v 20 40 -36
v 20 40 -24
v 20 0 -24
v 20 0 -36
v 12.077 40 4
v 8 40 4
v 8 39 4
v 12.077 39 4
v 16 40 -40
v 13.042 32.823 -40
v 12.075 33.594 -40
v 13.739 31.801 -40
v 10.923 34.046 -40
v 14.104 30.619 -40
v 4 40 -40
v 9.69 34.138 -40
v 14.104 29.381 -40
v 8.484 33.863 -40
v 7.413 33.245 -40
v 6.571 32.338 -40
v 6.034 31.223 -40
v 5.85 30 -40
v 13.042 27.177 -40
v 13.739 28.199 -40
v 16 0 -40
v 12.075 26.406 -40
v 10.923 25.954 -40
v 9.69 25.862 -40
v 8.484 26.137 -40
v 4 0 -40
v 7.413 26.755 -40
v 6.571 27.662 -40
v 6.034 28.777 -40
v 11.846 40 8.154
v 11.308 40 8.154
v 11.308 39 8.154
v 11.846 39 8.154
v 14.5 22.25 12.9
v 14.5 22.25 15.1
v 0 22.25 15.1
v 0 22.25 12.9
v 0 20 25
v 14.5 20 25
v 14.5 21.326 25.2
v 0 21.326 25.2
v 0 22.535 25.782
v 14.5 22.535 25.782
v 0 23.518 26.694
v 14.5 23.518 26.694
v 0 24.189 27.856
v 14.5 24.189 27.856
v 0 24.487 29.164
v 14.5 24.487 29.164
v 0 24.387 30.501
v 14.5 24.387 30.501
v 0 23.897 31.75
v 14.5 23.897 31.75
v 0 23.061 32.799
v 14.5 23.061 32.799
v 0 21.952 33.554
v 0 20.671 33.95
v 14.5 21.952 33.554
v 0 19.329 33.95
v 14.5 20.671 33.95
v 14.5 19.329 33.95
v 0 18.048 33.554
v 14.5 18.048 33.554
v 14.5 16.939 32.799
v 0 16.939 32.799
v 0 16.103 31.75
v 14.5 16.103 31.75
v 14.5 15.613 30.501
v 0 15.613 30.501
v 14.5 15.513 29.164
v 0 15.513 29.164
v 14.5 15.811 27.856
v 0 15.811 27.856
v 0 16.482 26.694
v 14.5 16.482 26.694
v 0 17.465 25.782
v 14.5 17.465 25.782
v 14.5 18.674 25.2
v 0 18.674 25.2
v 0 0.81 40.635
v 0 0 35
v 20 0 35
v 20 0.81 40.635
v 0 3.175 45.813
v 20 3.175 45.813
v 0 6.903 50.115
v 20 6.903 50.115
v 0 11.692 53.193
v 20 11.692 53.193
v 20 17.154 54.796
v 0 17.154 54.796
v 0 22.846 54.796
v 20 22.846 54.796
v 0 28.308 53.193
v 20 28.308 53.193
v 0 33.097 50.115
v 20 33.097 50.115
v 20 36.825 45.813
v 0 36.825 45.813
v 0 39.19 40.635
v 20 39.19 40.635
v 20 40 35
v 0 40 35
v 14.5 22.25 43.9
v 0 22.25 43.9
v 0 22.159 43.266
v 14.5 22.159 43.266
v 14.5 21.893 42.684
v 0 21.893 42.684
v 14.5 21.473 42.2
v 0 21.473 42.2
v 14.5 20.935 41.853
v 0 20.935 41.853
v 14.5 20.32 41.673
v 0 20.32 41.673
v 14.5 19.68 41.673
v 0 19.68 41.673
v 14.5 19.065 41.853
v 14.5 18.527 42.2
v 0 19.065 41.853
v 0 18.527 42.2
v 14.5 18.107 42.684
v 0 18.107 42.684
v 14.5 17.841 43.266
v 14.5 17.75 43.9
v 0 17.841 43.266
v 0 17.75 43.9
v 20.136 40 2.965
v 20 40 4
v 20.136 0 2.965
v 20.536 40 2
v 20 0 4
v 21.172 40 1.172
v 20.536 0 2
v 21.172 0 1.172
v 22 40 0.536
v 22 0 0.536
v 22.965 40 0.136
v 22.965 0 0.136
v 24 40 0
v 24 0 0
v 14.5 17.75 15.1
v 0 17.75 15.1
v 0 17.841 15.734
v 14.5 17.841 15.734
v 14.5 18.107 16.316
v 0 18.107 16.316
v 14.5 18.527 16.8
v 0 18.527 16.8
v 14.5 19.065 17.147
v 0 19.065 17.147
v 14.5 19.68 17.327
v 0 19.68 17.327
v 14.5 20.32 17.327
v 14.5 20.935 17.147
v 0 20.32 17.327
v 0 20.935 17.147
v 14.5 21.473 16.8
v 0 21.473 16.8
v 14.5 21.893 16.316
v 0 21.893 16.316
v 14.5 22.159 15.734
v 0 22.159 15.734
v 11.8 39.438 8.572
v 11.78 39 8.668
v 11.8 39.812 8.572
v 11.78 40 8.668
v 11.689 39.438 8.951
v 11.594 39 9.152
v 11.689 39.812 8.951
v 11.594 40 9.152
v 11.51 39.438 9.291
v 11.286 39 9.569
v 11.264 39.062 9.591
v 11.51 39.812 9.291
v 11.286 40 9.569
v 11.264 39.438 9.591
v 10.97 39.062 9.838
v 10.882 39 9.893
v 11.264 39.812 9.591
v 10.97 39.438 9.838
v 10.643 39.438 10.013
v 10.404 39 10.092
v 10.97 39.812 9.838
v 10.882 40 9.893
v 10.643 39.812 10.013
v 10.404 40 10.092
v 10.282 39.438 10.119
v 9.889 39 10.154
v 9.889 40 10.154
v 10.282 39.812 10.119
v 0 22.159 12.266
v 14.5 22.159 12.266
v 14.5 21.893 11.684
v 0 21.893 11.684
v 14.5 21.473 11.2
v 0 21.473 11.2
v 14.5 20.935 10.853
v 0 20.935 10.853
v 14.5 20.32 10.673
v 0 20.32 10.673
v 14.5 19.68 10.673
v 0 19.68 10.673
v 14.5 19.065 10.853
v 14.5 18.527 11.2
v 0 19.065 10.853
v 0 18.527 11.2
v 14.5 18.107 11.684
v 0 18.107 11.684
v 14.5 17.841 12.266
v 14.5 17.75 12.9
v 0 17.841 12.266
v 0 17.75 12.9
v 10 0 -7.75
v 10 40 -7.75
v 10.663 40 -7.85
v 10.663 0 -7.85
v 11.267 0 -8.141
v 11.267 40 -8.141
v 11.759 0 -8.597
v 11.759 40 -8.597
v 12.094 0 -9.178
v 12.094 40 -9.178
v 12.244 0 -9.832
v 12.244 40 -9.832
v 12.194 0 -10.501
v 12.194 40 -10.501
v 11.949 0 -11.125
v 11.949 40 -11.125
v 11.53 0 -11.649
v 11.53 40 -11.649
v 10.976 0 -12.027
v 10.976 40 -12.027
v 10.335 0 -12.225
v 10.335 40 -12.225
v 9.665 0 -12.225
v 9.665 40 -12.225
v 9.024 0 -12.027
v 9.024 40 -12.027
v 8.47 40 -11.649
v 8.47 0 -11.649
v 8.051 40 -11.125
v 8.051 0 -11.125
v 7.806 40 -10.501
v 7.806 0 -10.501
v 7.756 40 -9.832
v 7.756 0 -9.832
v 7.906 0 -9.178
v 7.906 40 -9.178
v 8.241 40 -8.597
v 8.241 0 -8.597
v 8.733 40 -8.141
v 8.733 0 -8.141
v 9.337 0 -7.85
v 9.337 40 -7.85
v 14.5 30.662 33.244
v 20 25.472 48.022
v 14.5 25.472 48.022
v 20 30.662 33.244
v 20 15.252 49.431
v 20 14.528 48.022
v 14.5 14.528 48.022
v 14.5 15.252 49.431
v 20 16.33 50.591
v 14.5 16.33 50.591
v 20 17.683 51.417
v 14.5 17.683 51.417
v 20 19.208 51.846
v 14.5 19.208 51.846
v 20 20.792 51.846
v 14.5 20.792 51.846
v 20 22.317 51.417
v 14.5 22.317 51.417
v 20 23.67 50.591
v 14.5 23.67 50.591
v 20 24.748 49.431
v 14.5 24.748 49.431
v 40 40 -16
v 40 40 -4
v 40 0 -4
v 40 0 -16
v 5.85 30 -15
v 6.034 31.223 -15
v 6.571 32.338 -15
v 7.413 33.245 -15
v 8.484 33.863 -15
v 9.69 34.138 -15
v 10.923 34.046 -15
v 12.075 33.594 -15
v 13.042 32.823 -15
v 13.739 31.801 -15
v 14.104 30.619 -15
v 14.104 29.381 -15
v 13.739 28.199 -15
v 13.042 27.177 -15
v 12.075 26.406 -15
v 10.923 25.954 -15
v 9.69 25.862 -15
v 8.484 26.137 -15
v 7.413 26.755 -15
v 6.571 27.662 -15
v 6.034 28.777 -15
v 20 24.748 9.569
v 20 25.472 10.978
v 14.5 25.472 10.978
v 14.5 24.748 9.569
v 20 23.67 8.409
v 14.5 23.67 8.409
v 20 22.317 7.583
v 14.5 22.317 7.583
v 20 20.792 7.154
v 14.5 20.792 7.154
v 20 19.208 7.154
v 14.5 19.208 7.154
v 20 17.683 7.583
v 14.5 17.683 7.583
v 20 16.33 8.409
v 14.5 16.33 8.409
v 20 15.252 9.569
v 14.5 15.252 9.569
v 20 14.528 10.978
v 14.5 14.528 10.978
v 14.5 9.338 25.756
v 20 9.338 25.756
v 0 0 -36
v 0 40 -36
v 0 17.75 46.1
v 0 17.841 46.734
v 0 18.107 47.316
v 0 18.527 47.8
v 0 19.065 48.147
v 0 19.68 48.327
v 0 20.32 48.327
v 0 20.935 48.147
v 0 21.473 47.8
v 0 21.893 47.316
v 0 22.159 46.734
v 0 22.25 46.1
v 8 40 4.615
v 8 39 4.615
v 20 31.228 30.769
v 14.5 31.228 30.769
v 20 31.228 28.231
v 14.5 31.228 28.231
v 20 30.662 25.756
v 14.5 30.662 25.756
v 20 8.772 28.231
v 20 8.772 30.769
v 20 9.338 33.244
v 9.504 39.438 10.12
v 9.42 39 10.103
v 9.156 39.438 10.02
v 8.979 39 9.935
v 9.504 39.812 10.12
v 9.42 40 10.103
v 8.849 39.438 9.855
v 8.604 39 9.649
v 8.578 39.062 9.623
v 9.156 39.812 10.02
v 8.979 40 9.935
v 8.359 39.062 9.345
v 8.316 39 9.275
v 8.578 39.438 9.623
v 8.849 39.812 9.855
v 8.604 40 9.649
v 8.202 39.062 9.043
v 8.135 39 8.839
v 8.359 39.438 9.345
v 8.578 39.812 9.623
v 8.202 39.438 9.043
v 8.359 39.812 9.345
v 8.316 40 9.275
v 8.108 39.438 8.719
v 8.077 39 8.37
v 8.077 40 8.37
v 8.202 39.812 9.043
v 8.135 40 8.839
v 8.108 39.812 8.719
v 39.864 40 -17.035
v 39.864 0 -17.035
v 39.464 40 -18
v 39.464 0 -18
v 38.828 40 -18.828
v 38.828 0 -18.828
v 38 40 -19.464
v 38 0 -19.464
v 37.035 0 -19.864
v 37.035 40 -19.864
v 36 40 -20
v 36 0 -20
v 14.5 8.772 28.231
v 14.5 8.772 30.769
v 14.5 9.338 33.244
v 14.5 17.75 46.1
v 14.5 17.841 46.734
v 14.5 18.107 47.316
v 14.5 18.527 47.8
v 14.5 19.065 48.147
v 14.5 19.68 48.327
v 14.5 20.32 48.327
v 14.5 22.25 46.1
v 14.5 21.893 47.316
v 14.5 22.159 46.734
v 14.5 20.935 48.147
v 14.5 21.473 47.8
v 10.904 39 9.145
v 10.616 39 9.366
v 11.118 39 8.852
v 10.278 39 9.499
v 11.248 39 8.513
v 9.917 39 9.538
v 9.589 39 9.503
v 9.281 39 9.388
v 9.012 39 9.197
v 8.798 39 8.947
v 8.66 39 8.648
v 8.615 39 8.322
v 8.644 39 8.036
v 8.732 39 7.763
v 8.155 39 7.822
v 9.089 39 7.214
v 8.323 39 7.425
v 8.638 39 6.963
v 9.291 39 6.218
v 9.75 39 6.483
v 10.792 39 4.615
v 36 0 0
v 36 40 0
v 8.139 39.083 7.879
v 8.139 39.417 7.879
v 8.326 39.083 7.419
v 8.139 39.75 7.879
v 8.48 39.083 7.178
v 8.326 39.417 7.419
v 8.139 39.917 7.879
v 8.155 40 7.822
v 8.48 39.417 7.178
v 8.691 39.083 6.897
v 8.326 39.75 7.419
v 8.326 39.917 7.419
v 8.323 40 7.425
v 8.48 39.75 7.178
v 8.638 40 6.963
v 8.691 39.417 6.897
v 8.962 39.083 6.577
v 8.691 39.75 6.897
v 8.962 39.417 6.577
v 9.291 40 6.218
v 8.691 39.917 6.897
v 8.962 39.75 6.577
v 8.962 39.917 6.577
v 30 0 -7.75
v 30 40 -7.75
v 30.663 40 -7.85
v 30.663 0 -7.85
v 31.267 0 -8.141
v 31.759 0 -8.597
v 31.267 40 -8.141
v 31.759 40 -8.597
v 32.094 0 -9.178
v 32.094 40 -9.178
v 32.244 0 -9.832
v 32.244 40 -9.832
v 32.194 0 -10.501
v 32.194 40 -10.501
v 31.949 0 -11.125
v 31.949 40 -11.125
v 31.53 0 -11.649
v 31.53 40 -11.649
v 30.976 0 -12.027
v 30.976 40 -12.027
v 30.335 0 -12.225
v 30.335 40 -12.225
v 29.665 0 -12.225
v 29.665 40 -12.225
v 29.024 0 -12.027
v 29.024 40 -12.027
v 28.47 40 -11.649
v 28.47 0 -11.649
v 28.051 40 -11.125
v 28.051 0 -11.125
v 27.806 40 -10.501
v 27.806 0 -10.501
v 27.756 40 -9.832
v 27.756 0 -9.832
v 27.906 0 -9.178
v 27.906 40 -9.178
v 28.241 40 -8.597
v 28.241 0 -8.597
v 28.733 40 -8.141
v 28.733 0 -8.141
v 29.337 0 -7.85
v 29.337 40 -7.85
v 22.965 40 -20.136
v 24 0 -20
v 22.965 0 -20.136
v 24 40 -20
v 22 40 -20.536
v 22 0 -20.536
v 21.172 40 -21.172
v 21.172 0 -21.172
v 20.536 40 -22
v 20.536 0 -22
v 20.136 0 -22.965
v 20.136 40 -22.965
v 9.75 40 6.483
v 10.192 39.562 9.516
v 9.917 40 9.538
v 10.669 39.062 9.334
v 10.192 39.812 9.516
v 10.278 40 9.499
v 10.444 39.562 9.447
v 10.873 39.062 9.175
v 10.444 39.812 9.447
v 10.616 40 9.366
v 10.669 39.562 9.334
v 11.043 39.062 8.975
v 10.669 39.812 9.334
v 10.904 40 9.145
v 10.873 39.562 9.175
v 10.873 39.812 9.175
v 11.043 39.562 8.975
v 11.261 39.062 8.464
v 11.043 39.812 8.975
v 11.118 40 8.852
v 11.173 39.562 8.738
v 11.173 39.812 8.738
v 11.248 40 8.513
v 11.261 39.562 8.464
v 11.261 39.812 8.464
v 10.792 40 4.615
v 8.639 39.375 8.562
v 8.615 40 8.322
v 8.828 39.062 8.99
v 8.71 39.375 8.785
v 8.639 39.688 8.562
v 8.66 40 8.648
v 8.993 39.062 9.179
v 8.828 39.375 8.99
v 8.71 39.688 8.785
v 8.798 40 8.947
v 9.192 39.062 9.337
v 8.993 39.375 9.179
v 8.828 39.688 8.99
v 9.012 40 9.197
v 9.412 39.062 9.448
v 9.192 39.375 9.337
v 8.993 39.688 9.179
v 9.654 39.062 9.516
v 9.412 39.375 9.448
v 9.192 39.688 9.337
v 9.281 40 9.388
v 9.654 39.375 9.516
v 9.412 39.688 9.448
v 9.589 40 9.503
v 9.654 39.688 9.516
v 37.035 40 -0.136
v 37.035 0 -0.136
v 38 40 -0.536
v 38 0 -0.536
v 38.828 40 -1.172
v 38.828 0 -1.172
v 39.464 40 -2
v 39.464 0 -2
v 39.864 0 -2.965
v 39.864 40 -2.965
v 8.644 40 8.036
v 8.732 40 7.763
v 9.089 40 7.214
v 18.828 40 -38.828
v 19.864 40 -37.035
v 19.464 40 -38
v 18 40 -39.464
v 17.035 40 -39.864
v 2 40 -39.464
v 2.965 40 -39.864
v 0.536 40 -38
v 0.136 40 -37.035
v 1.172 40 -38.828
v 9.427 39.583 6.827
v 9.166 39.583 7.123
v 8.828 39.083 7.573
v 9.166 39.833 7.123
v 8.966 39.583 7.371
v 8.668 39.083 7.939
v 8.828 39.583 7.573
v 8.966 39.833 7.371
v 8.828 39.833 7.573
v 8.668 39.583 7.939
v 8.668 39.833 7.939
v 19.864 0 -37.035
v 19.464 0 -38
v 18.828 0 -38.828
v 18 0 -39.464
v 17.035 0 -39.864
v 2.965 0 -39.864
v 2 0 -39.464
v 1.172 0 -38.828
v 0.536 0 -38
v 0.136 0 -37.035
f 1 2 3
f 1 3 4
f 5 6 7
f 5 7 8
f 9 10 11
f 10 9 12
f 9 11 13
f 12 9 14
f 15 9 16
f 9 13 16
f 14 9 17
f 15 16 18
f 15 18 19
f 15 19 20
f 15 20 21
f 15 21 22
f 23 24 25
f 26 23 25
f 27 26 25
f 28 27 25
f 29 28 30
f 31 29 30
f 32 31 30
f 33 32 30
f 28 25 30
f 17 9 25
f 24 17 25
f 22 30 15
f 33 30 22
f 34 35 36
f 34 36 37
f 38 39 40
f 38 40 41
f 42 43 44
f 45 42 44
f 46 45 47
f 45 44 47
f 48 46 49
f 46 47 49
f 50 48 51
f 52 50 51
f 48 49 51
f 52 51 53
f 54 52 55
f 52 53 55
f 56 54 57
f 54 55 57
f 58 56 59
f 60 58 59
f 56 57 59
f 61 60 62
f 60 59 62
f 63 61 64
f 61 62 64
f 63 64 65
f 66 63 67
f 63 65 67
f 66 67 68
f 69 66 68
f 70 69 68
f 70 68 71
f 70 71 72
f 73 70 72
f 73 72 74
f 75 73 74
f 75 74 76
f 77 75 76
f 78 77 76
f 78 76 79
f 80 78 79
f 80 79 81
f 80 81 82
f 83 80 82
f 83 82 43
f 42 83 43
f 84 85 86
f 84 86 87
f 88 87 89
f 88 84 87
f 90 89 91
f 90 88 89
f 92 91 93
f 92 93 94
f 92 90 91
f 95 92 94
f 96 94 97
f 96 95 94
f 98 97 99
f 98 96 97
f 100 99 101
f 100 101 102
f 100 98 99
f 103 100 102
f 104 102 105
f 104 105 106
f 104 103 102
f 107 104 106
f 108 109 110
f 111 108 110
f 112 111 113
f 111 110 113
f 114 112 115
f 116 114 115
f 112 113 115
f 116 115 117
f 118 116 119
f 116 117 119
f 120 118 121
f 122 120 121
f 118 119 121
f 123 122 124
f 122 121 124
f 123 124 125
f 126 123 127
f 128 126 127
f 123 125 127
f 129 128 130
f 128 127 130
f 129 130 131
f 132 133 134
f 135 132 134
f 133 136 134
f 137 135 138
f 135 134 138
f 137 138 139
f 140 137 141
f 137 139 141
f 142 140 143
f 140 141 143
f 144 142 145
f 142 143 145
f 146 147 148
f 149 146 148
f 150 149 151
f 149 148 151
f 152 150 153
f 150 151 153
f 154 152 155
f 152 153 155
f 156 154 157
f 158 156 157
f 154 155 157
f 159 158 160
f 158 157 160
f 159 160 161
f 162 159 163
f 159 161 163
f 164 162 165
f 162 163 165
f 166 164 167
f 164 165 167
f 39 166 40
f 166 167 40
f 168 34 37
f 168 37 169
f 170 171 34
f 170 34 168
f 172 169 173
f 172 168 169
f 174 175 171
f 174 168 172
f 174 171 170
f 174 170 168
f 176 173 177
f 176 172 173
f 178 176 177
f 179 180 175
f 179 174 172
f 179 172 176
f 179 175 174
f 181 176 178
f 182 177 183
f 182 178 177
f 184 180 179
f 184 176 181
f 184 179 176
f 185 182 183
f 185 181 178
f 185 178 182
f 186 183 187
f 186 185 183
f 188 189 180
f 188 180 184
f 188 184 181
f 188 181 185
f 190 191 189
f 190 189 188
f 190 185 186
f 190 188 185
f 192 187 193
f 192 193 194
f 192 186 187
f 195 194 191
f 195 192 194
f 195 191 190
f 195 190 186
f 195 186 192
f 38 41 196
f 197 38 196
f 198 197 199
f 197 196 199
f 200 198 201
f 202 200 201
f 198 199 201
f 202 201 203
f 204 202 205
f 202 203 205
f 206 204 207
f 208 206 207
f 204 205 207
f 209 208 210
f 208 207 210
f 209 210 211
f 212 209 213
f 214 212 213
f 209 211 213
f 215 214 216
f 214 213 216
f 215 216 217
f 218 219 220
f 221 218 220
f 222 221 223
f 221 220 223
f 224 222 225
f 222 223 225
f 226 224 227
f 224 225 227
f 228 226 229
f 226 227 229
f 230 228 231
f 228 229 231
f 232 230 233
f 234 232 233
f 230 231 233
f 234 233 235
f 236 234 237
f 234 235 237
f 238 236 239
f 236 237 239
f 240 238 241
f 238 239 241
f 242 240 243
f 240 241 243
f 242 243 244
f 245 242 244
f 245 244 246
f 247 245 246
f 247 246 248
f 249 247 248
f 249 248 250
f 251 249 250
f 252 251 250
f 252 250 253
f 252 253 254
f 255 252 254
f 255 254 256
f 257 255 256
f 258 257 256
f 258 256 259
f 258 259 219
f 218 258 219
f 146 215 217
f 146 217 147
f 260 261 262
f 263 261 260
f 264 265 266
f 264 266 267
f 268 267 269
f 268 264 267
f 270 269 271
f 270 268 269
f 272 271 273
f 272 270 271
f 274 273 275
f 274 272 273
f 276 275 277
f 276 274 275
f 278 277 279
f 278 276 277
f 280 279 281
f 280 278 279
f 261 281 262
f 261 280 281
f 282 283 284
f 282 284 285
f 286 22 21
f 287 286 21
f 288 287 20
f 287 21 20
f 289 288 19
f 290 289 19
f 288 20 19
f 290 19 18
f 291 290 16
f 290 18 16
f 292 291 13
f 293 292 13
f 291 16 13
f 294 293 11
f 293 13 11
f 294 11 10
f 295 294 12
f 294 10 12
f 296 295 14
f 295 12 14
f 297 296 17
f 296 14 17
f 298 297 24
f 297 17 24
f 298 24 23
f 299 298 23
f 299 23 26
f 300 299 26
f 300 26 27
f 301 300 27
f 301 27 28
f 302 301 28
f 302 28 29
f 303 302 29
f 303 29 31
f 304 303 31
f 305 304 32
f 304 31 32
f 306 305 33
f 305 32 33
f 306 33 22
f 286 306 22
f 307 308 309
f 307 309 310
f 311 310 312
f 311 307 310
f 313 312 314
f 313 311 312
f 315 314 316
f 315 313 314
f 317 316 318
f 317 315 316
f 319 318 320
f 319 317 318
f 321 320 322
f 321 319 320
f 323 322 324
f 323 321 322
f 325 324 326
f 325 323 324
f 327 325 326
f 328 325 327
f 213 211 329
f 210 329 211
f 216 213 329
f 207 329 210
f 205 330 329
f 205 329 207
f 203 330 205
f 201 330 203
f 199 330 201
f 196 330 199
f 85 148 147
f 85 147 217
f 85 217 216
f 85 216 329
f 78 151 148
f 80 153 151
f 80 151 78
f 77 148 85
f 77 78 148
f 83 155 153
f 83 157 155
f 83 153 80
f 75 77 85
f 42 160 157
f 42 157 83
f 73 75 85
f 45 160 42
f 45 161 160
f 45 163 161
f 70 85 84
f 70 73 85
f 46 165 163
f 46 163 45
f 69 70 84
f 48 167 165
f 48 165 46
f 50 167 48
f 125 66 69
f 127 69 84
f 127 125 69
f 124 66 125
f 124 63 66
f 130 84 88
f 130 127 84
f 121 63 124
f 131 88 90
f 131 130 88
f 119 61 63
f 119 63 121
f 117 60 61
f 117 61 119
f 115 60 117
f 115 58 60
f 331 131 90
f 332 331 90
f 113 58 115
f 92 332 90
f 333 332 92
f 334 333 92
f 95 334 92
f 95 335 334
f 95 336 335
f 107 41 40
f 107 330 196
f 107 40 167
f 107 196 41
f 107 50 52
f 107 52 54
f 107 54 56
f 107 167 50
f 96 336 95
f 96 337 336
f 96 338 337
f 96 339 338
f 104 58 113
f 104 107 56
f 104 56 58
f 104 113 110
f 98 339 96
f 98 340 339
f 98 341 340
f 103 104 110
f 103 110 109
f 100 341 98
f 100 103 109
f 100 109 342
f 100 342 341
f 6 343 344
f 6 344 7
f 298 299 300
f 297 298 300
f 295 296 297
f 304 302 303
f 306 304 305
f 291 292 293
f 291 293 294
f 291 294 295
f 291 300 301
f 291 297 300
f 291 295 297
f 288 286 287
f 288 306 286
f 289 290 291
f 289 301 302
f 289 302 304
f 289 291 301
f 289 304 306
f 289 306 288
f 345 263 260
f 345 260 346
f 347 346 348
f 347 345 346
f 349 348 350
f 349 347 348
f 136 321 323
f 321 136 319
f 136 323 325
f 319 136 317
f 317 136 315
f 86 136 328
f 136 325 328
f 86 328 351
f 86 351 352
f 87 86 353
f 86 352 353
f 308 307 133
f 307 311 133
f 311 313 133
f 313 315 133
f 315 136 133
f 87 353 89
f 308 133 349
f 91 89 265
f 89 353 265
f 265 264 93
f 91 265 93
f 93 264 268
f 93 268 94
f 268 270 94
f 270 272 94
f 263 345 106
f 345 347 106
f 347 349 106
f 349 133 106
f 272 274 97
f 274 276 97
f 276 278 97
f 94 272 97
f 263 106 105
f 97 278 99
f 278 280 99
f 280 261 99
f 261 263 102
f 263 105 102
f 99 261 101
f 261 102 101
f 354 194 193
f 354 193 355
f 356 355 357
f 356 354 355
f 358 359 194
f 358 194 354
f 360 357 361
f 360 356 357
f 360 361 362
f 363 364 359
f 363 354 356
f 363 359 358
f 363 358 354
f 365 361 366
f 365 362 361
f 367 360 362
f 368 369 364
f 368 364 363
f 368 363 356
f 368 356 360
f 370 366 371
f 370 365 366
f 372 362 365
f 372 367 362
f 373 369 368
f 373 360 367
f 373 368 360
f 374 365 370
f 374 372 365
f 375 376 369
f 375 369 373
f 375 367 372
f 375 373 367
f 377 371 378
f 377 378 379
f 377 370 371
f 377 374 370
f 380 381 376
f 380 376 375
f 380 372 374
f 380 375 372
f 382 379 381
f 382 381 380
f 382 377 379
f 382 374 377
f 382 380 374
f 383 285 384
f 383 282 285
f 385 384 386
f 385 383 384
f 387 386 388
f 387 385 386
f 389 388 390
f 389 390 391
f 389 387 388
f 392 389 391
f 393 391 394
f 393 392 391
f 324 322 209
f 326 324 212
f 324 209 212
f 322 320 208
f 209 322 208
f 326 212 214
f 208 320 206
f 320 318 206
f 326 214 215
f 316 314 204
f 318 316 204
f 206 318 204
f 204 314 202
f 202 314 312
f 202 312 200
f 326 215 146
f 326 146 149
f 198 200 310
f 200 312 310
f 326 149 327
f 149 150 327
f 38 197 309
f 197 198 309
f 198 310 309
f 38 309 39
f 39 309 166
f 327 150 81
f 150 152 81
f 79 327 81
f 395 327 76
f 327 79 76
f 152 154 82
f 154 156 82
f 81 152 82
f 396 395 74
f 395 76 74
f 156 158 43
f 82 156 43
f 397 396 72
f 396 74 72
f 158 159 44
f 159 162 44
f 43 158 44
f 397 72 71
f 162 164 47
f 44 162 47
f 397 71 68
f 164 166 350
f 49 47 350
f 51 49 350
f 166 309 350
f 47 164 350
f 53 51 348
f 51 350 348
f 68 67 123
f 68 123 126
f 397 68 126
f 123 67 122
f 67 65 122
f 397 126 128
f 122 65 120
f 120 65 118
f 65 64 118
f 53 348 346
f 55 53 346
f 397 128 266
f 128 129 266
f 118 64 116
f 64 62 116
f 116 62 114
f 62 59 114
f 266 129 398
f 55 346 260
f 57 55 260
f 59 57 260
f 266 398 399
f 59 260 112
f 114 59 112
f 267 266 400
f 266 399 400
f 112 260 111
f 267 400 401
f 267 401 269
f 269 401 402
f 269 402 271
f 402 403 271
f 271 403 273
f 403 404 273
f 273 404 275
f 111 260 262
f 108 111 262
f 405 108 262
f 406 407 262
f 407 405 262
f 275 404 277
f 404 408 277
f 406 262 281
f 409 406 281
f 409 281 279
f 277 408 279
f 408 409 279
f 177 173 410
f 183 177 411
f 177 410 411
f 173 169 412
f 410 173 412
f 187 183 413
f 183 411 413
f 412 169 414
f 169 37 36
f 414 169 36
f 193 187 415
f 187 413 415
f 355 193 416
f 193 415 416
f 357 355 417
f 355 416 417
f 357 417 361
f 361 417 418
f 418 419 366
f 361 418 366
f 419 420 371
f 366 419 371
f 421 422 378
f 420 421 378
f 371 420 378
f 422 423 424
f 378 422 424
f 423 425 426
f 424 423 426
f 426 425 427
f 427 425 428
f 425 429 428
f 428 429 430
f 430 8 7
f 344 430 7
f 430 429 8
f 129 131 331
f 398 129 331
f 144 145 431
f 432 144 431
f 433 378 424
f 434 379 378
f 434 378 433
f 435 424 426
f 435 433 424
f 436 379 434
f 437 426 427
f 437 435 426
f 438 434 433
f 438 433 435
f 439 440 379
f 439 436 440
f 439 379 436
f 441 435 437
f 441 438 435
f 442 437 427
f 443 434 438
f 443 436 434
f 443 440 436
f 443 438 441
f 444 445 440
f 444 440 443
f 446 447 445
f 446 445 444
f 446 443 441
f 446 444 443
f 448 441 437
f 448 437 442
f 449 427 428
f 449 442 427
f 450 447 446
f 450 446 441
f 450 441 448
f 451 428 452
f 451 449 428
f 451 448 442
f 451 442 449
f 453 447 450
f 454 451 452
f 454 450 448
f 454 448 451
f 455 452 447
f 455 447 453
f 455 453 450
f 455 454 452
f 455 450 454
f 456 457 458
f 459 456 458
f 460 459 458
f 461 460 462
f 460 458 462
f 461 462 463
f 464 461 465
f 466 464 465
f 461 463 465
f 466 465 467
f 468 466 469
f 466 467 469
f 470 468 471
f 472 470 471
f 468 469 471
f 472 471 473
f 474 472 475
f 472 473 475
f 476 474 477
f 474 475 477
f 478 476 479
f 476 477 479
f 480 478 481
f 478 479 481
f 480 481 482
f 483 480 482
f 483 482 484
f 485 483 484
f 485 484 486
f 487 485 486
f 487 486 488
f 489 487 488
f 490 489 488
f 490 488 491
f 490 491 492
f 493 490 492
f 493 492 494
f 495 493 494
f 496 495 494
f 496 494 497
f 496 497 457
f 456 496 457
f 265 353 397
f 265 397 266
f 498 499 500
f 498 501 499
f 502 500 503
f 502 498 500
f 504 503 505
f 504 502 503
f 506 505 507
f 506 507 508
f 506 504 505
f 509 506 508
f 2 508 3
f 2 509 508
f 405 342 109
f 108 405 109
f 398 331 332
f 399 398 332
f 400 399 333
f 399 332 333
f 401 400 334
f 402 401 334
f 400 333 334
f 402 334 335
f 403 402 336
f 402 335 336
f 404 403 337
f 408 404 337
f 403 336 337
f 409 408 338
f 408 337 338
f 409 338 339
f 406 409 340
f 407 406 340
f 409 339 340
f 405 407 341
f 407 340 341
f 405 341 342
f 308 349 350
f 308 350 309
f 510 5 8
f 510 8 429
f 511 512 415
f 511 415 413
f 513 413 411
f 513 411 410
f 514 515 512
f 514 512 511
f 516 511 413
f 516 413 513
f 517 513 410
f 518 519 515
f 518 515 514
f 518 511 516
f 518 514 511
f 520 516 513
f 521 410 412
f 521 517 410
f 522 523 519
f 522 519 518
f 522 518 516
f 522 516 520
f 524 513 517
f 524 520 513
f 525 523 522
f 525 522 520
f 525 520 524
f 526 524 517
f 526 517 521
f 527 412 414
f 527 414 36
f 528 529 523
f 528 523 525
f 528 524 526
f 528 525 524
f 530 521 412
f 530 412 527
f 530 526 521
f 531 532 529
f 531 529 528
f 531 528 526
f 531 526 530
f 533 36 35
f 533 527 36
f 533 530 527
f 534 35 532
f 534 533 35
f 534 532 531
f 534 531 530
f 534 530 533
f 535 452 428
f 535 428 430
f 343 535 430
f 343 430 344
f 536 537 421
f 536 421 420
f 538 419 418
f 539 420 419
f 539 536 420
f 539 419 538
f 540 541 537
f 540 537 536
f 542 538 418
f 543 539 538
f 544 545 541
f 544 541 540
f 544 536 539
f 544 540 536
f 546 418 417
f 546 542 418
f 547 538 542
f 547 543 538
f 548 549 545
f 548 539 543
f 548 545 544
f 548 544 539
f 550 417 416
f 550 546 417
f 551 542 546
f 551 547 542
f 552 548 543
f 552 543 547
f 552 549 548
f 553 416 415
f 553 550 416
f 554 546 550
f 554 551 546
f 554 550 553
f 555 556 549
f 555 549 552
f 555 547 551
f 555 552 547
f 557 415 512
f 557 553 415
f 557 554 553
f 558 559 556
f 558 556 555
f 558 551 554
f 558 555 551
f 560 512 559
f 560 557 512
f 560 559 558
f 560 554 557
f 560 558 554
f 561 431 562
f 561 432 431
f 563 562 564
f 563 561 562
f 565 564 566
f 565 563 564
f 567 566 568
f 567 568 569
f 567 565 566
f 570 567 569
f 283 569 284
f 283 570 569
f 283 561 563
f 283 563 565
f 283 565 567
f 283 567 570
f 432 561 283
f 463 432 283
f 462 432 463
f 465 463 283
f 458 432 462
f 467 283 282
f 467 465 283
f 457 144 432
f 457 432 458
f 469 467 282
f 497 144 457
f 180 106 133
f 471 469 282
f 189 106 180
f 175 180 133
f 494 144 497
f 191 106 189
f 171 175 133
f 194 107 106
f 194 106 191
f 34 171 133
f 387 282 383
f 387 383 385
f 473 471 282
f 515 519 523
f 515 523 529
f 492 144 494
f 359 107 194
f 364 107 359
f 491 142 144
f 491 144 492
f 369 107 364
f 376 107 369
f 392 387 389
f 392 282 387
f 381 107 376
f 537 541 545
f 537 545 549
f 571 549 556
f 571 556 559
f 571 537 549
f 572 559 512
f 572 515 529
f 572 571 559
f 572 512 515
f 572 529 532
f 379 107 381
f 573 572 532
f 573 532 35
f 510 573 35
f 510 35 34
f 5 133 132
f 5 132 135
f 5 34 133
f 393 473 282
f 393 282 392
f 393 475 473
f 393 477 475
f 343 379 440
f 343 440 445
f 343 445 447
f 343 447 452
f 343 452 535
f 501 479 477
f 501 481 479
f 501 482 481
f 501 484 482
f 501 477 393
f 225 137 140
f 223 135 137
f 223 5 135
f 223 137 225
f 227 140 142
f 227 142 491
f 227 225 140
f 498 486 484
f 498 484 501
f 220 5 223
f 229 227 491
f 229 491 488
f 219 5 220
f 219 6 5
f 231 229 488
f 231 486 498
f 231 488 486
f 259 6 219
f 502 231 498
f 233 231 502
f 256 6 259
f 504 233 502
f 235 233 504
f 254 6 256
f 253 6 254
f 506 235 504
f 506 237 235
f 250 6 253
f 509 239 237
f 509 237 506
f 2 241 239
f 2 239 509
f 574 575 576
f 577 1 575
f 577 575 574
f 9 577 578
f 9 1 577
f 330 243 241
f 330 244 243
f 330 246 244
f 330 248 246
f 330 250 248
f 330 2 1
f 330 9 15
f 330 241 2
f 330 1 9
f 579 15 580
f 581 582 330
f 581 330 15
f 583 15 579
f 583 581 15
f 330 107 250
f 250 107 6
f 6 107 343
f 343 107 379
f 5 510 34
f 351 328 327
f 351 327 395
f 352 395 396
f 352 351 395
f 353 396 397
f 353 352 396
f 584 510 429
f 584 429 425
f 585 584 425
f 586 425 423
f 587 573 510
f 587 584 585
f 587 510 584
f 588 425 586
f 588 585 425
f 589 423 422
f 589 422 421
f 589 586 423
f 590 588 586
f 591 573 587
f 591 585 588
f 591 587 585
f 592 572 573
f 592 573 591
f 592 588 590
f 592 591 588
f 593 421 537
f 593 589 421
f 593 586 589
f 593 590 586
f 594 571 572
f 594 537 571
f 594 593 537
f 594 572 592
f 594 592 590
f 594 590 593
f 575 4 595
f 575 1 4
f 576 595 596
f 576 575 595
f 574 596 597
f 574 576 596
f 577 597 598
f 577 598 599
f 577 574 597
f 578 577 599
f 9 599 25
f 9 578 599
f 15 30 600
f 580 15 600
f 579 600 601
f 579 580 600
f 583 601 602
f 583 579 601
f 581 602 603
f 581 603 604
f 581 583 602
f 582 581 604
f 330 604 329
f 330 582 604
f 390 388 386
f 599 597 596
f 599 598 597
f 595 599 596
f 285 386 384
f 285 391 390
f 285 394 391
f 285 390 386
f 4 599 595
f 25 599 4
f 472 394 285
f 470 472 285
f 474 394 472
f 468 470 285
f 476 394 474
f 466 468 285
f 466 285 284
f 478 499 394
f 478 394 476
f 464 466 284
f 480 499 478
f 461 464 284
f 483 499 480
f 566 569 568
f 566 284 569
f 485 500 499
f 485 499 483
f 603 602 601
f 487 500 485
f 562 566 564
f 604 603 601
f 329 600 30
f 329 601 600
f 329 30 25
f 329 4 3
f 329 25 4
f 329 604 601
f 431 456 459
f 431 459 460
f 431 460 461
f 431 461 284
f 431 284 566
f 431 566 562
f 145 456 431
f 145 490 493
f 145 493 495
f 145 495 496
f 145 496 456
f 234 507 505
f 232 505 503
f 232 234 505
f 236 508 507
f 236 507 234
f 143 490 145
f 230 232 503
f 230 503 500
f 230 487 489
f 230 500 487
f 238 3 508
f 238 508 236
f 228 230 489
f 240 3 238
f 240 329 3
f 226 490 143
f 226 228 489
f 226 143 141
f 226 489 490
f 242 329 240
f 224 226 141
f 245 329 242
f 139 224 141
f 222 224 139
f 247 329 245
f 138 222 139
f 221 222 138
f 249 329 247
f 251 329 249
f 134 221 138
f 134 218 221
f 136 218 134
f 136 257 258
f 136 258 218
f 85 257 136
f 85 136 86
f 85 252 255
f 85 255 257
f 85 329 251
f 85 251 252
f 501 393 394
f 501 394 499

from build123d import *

# Parameters (mm, degrees)
SALIENTE_EXTRUIR1_DEPTH = 40
CORTAR_EXTRUIR1_REACH   = 71.282
CROQUIS2_R              = 2.25
SALIENTE_EXTRUIR2_DEPTH = 20
CROQUIS5_R              = 4.15
CORTAR_EXTRUIR2_DEPTH   = 25
REDONDEO2_R             = 4
CORTAR_EXTRUIR3_REACH   = 72.887
CROQUIS10_R             = 4.5
CROQUIS10_R_2           = 2.25
CORTAR_EXTRUIR5_START   = -20
CORTAR_EXTRUIR5_DEPTH   = 20
CORTAR_EXTRUIR6_DEPTH   = 5.5
CORTAR_EXTRUIR7_DEPTH   = 1


with BuildPart() as part:
    # Croquis1 → Saliente-Extruir1 (new body)
    with BuildSketch(Plane(origin=(0, 0, 0), x_dir=(1, 0, 0), z_dir=(0, 1, 0))):
        Polygon((0, 0), (40, 0), (40, 20), (20, 20), (20, 40), (0, 40), align=None)
    extrude(amount=SALIENTE_EXTRUIR1_DEPTH)

    # Croquis2 → Cortar-Extruir1 (cut, up to next)
    with BuildSketch(Plane(origin=(0, 40, 0), x_dir=(1, 0, 0), z_dir=(0, 1, 0)), mode=Mode.PRIVATE) as cortar_extruir1_sk1:
        with Locations(Location((30, 10, 0), (0, 0, 270))):
            Circle(CROQUIS2_R)
    cortar_extruir1_tool1 = extrude(cortar_extruir1_sk1.sketch, amount=-CORTAR_EXTRUIR1_REACH, mode=Mode.PRIVATE) & part.part
    # Croquis2 → Cortar-Extruir1 (cut, up to next)
    with BuildSketch(Plane(origin=(0, 40, 0), x_dir=(1, 0, 0), z_dir=(0, 1, 0)), mode=Mode.PRIVATE) as cortar_extruir1_sk2:
        with Locations(Location((10, 10, 0), (0, 0, 270))):
            Circle(CROQUIS2_R)
    cortar_extruir1_tool2 = extrude(cortar_extruir1_sk2.sketch, amount=-CORTAR_EXTRUIR1_REACH, mode=Mode.PRIVATE) & part.part
    add(cortar_extruir1_tool1.solids().sort_by_distance((30, 40, -10))[0], mode=Mode.SUBTRACT)
    add(cortar_extruir1_tool2.solids().sort_by_distance((10, 40, -10))[0], mode=Mode.SUBTRACT)

    # Croquis3 → Saliente-Extruir2 (add)
    with BuildSketch(Plane.ZY):
        with BuildLine():
            Line((35, 40), (0, 40))
            Line((0, 40), (0, 0))
            Line((0, 0), (35, 0))
            ThreePointArc((35, 0), (55, 20), (35, 40))
        make_face()
    extrude(amount=-SALIENTE_EXTRUIR2_DEPTH)

    # Croquis5 → Cortar-Extruir2 (cut)
    with BuildSketch(Plane(origin=(0, 0, -40), x_dir=(-1, 0, 0), z_dir=(0, 0, -1))):
        with Locations((-10, 30)):
            Circle(CROQUIS5_R)
    extrude(amount=-CORTAR_EXTRUIR2_DEPTH, mode=Mode.SUBTRACT)

    # Redondeo2
    redondeo2_edges = [part.edges().sort_by_distance(p)[0] for p in [
        (0, 20, -40),
        (20, 20, -40),
        (20, 20, -20),
        (40, 20, -20),
        (40, 20, 0),
        (20, 20, 0),
    ]]
    fillet(redondeo2_edges, radius=REDONDEO2_R)

    # Croquis10 → Cortar-Extruir3 (cut, up to next)
    with BuildSketch(Plane(origin=(20, 0, 0), x_dir=(0, 0, -1), z_dir=(1, 0, 0)), mode=Mode.PRIVATE) as cortar_extruir3_sk1:
        with Locations((-29.5, 20)):
            Circle(CROQUIS10_R)
    cortar_extruir3_tool1 = extrude(cortar_extruir3_sk1.sketch, amount=-CORTAR_EXTRUIR3_REACH, mode=Mode.PRIVATE) & part.part
    # Croquis10 → Cortar-Extruir3 (cut, up to next)
    with BuildSketch(Plane(origin=(20, 0, 0), x_dir=(0, 0, -1), z_dir=(1, 0, 0)), mode=Mode.PRIVATE) as cortar_extruir3_sk2:
        with Locations((-14, 20)):
            Circle(CROQUIS10_R_2)
    cortar_extruir3_tool2 = extrude(cortar_extruir3_sk2.sketch, amount=-CORTAR_EXTRUIR3_REACH, mode=Mode.PRIVATE) & part.part
    # Croquis10 → Cortar-Extruir3 (cut, up to next)
    with BuildSketch(Plane(origin=(20, 0, 0), x_dir=(0, 0, -1), z_dir=(1, 0, 0)), mode=Mode.PRIVATE) as cortar_extruir3_sk3:
        with Locations((-45, 20)):
            Circle(CROQUIS10_R_2)
    cortar_extruir3_tool3 = extrude(cortar_extruir3_sk3.sketch, amount=-CORTAR_EXTRUIR3_REACH, mode=Mode.PRIVATE) & part.part
    add(cortar_extruir3_tool1.solids().sort_by_distance((20, 20, 29.5))[0], mode=Mode.SUBTRACT)
    add(cortar_extruir3_tool2.solids().sort_by_distance((20, 20, 14))[0], mode=Mode.SUBTRACT)
    add(cortar_extruir3_tool3.solids().sort_by_distance((20, 20, 45))[0], mode=Mode.SUBTRACT)

    # Croquis12 → Cortar-Extruir5 (cut)
    with BuildSketch(Plane(origin=(20, 0, 0), x_dir=(0, 0, -1), z_dir=(1, 0, 0)).offset(CORTAR_EXTRUIR5_START)):
        with BuildLine():
            Line((-15.1, 22.25), (-12.9, 22.25))
            ThreePointArc((-12.9, 22.25), (-10.65, 20), (-12.9, 17.75))
            Line((-12.9, 17.75), (-15.1, 17.75))
            ThreePointArc((-15.1, 17.75), (-17.35, 20), (-15.1, 22.25))
        make_face()
        with BuildLine():
            Line((-43.9, 17.75), (-46.1, 17.75))
            ThreePointArc((-46.1, 17.75), (-48.35, 20), (-46.1, 22.25))
            Line((-46.1, 22.25), (-43.9, 22.25))
            ThreePointArc((-43.9, 22.25), (-41.65, 20), (-43.9, 17.75))
        make_face()
    extrude(amount=CORTAR_EXTRUIR5_DEPTH, mode=Mode.SUBTRACT)

    # Croquis14 → Cortar-Extruir6 (cut)
    with BuildSketch(Plane(origin=(20, 0, 0), x_dir=(0, 0, -1), z_dir=(1, 0, 0))):
        with BuildLine():
            Line((-48.021686747, 25.472396189), (-33.243975904, 30.661737402))
            ThreePointArc((-33.243975904, 30.661737402), (-29.5, 31.3), (-25.756024096, 30.661737402))
            Line((-25.756024096, 30.661737402), (-10.978313253, 25.472396189))
            ThreePointArc((-10.978313253, 25.472396189), (-7.1, 20), (-10.978313253, 14.527603811))
            Line((-10.978313253, 14.527603811), (-25.756024096, 9.338262598))
            ThreePointArc((-25.756024096, 9.338262598), (-29.5, 8.7), (-33.243975904, 9.338262598))
            Line((-33.243975904, 9.338262598), (-48.021686747, 14.527603811))
            ThreePointArc((-48.021686747, 14.527603811), (-51.9, 20), (-48.021686747, 25.472396189))
        make_face()
    extrude(amount=-CORTAR_EXTRUIR6_DEPTH, mode=Mode.SUBTRACT)

    # Croquis15 → Cortar-Extruir7 (cut)
    with BuildSketch(Plane(origin=(0, 40, 0), x_dir=(1, 0, 0), z_dir=(0, 1, 0))):
        with BuildLine():
            Line((11.307692308, -8.153846154), (11.846153846, -8.153846154))
            add(Edge.make_bspline(
                [(11.846153846, -8.153846154), (11.842645038, -8.225282314), (11.835753833, -8.36558103), (11.803468313, -8.570131316), (11.757314544, -8.765671861), (11.691903885, -8.950526266), (11.611127437, -9.126902771), (11.512233689, -9.292459299), (11.397330895, -9.448838982), (11.266629849, -9.593081031), (11.124807169, -9.724936298), (10.972712592, -9.840005009), (10.811909364, -9.936114468), (10.643792222, -10.016896686), (10.466416843, -10.077459923), (10.281478736, -10.12241659), (10.088142, -10.149460313), (9.956416396, -10.152367573), (9.889423077, -10.153846154)],
                knots=[0, 0, 0, 0, 1.100776268, 2.161895295, 3.184016182, 4.190939212, 5.176500551, 6.166955529, 7.155448256, 8.160289653, 9.16017456, 10.133824356, 11.091467644, 12.04088621, 13.000931625, 13.972173743, 14.968683325, 16, 16, 16, 16], degree=3))
            add(Edge.make_bspline(
                [(9.889423077, -10.153846154), (9.823627463, -10.152318442), (9.694341431, -10.149316542), (9.50572919, -10.123149389), (9.325747878, -10.08305056), (9.15643722, -10.023630413), (8.996059613, -9.949071125), (8.846600799, -9.856346883), (8.704446708, -9.749845084), (8.576574014, -9.62422099), (8.459107518, -9.490179765), (8.357858501, -9.347024863), (8.270662051, -9.198998287), (8.19929448, -9.044943733), (8.145194688, -8.884359526), (8.105111926, -8.71878524), (8.082198454, -8.546310036), (8.078701137, -8.429552583), (8.076923077, -8.370192308)],
                knots=[0, 0, 0, 0, 1.111674182, 2.184400057, 3.212814286, 4.223731311, 5.211378316, 6.196328225, 7.191884489, 8.207283132, 9.220262353, 10.201199469, 11.166417575, 12.120932471, 13.06540007, 14.026332106, 14.996573967, 16, 16, 16, 16], degree=3))
            add(Edge.make_bspline(
                [(8.076923077, -8.370192308), (8.079825859, -8.286624627), (8.085580483, -8.120955761), (8.13480446, -7.877501183), (8.211686738, -7.641628758), (8.304245432, -7.451786912), (8.397645126, -7.298829691), (8.481727628, -7.172830092), (8.580719899, -7.037198101), (8.693776191, -6.891384748), (8.822843495, -6.737299583), (8.964568659, -6.571798854), (9.122611785, -6.397942783), (9.233438011, -6.279119385), (9.290865385, -6.217548077)],
                knots=[0, 0, 0, 0, 1.184416499, 2.348048165, 3.509039915, 4.696071444, 5.333504901, 6.05069495, 6.844171097, 7.714965912, 8.667477798, 9.695072654, 10.805644396, 12, 12, 12, 12], degree=3))
            Line((9.290865385, -6.217548077), (10.792067308, -4.615384615))
            Line((10.792067308, -4.615384615), (8, -4.615384615))
            Line((8, -4.615384615), (8, -4))
            Line((8, -4), (12.076923077, -4))
            Line((12.076923077, -4), (9.75, -6.483173077))
            add(Edge.make_bspline(
                [(9.75, -6.483173077), (9.693342469, -6.542309805), (9.584514946, -6.655899358), (9.430654729, -6.82178687), (9.292241226, -6.975502303), (9.169182624, -7.117726807), (9.061377669, -7.2476541), (8.969171289, -7.366302394), (8.892155948, -7.472653483), (8.810535736, -7.597590295), (8.732705448, -7.750311776), (8.664300588, -7.936006624), (8.622889216, -8.127587641), (8.617896164, -8.257013212), (8.615384615, -8.322115385)],
                knots=[0, 0, 0, 0, 1.329530082, 2.553755191, 3.672934919, 4.687409497, 5.60679272, 6.413407421, 7.126401618, 7.737995624, 8.834647426, 9.90044882, 10.943907757, 12, 12, 12, 12], degree=3))
            add(Edge.make_bspline(
                [(8.615384615, -8.322115385), (8.616463264, -8.363059449), (8.618589075, -8.443752337), (8.637705753, -8.561983012), (8.665791949, -8.676472493), (8.709081452, -8.7858052), (8.761092196, -8.892131494), (8.827539757, -8.992218726), (8.903471871, -9.089478629), (8.991549398, -9.180576241), (9.088242157, -9.264035799), (9.190407045, -9.337961219), (9.298492072, -9.399742965), (9.4120468, -9.45038885), (9.530753256, -9.490118105), (9.654841407, -9.51764709), (9.783968288, -9.53493135), (9.872139995, -9.53726993), (9.917067308, -9.538461538)],
                knots=[0, 0, 0, 0, 0.991504627, 1.954065223, 2.895985987, 3.842598665, 4.797835564, 5.759220273, 6.74786863, 7.784730864, 8.824135544, 9.839918996, 10.835834653, 11.835434876, 12.84861661, 13.863796685, 14.911511676, 16, 16, 16, 16], degree=3))
            add(Edge.make_bspline(
                [(9.917067308, -9.538461538), (9.964000721, -9.537284508), (10.056170195, -9.534973014), (10.191204591, -9.5174538), (10.320924626, -9.490921844), (10.443331351, -9.448683187), (10.560986519, -9.399248357), (10.67088869, -9.335238949), (10.776125151, -9.262098301), (10.874580094, -9.17682095), (10.964251271, -9.080555667), (11.045825943, -8.975772607), (11.114944972, -8.860614179), (11.176301237, -8.737843643), (11.223226665, -8.604087986), (11.263344544, -8.462618365), (11.29248559, -8.311416341), (11.302539212, -8.20724191), (11.307692308, -8.153846154)],
                knots=[0, 0, 0, 0, 1.031072318, 2.024855787, 2.988461151, 3.935103592, 4.865765533, 5.788564469, 6.724086513, 7.67908574, 8.64457978, 9.611397706, 10.591395687, 11.591555111, 12.622101007, 13.700900657, 14.821571223, 16, 16, 16, 16], degree=3))
        make_face()
    extrude(amount=-CORTAR_EXTRUIR7_DEPTH, mode=Mode.SUBTRACT)


solid = part.part
